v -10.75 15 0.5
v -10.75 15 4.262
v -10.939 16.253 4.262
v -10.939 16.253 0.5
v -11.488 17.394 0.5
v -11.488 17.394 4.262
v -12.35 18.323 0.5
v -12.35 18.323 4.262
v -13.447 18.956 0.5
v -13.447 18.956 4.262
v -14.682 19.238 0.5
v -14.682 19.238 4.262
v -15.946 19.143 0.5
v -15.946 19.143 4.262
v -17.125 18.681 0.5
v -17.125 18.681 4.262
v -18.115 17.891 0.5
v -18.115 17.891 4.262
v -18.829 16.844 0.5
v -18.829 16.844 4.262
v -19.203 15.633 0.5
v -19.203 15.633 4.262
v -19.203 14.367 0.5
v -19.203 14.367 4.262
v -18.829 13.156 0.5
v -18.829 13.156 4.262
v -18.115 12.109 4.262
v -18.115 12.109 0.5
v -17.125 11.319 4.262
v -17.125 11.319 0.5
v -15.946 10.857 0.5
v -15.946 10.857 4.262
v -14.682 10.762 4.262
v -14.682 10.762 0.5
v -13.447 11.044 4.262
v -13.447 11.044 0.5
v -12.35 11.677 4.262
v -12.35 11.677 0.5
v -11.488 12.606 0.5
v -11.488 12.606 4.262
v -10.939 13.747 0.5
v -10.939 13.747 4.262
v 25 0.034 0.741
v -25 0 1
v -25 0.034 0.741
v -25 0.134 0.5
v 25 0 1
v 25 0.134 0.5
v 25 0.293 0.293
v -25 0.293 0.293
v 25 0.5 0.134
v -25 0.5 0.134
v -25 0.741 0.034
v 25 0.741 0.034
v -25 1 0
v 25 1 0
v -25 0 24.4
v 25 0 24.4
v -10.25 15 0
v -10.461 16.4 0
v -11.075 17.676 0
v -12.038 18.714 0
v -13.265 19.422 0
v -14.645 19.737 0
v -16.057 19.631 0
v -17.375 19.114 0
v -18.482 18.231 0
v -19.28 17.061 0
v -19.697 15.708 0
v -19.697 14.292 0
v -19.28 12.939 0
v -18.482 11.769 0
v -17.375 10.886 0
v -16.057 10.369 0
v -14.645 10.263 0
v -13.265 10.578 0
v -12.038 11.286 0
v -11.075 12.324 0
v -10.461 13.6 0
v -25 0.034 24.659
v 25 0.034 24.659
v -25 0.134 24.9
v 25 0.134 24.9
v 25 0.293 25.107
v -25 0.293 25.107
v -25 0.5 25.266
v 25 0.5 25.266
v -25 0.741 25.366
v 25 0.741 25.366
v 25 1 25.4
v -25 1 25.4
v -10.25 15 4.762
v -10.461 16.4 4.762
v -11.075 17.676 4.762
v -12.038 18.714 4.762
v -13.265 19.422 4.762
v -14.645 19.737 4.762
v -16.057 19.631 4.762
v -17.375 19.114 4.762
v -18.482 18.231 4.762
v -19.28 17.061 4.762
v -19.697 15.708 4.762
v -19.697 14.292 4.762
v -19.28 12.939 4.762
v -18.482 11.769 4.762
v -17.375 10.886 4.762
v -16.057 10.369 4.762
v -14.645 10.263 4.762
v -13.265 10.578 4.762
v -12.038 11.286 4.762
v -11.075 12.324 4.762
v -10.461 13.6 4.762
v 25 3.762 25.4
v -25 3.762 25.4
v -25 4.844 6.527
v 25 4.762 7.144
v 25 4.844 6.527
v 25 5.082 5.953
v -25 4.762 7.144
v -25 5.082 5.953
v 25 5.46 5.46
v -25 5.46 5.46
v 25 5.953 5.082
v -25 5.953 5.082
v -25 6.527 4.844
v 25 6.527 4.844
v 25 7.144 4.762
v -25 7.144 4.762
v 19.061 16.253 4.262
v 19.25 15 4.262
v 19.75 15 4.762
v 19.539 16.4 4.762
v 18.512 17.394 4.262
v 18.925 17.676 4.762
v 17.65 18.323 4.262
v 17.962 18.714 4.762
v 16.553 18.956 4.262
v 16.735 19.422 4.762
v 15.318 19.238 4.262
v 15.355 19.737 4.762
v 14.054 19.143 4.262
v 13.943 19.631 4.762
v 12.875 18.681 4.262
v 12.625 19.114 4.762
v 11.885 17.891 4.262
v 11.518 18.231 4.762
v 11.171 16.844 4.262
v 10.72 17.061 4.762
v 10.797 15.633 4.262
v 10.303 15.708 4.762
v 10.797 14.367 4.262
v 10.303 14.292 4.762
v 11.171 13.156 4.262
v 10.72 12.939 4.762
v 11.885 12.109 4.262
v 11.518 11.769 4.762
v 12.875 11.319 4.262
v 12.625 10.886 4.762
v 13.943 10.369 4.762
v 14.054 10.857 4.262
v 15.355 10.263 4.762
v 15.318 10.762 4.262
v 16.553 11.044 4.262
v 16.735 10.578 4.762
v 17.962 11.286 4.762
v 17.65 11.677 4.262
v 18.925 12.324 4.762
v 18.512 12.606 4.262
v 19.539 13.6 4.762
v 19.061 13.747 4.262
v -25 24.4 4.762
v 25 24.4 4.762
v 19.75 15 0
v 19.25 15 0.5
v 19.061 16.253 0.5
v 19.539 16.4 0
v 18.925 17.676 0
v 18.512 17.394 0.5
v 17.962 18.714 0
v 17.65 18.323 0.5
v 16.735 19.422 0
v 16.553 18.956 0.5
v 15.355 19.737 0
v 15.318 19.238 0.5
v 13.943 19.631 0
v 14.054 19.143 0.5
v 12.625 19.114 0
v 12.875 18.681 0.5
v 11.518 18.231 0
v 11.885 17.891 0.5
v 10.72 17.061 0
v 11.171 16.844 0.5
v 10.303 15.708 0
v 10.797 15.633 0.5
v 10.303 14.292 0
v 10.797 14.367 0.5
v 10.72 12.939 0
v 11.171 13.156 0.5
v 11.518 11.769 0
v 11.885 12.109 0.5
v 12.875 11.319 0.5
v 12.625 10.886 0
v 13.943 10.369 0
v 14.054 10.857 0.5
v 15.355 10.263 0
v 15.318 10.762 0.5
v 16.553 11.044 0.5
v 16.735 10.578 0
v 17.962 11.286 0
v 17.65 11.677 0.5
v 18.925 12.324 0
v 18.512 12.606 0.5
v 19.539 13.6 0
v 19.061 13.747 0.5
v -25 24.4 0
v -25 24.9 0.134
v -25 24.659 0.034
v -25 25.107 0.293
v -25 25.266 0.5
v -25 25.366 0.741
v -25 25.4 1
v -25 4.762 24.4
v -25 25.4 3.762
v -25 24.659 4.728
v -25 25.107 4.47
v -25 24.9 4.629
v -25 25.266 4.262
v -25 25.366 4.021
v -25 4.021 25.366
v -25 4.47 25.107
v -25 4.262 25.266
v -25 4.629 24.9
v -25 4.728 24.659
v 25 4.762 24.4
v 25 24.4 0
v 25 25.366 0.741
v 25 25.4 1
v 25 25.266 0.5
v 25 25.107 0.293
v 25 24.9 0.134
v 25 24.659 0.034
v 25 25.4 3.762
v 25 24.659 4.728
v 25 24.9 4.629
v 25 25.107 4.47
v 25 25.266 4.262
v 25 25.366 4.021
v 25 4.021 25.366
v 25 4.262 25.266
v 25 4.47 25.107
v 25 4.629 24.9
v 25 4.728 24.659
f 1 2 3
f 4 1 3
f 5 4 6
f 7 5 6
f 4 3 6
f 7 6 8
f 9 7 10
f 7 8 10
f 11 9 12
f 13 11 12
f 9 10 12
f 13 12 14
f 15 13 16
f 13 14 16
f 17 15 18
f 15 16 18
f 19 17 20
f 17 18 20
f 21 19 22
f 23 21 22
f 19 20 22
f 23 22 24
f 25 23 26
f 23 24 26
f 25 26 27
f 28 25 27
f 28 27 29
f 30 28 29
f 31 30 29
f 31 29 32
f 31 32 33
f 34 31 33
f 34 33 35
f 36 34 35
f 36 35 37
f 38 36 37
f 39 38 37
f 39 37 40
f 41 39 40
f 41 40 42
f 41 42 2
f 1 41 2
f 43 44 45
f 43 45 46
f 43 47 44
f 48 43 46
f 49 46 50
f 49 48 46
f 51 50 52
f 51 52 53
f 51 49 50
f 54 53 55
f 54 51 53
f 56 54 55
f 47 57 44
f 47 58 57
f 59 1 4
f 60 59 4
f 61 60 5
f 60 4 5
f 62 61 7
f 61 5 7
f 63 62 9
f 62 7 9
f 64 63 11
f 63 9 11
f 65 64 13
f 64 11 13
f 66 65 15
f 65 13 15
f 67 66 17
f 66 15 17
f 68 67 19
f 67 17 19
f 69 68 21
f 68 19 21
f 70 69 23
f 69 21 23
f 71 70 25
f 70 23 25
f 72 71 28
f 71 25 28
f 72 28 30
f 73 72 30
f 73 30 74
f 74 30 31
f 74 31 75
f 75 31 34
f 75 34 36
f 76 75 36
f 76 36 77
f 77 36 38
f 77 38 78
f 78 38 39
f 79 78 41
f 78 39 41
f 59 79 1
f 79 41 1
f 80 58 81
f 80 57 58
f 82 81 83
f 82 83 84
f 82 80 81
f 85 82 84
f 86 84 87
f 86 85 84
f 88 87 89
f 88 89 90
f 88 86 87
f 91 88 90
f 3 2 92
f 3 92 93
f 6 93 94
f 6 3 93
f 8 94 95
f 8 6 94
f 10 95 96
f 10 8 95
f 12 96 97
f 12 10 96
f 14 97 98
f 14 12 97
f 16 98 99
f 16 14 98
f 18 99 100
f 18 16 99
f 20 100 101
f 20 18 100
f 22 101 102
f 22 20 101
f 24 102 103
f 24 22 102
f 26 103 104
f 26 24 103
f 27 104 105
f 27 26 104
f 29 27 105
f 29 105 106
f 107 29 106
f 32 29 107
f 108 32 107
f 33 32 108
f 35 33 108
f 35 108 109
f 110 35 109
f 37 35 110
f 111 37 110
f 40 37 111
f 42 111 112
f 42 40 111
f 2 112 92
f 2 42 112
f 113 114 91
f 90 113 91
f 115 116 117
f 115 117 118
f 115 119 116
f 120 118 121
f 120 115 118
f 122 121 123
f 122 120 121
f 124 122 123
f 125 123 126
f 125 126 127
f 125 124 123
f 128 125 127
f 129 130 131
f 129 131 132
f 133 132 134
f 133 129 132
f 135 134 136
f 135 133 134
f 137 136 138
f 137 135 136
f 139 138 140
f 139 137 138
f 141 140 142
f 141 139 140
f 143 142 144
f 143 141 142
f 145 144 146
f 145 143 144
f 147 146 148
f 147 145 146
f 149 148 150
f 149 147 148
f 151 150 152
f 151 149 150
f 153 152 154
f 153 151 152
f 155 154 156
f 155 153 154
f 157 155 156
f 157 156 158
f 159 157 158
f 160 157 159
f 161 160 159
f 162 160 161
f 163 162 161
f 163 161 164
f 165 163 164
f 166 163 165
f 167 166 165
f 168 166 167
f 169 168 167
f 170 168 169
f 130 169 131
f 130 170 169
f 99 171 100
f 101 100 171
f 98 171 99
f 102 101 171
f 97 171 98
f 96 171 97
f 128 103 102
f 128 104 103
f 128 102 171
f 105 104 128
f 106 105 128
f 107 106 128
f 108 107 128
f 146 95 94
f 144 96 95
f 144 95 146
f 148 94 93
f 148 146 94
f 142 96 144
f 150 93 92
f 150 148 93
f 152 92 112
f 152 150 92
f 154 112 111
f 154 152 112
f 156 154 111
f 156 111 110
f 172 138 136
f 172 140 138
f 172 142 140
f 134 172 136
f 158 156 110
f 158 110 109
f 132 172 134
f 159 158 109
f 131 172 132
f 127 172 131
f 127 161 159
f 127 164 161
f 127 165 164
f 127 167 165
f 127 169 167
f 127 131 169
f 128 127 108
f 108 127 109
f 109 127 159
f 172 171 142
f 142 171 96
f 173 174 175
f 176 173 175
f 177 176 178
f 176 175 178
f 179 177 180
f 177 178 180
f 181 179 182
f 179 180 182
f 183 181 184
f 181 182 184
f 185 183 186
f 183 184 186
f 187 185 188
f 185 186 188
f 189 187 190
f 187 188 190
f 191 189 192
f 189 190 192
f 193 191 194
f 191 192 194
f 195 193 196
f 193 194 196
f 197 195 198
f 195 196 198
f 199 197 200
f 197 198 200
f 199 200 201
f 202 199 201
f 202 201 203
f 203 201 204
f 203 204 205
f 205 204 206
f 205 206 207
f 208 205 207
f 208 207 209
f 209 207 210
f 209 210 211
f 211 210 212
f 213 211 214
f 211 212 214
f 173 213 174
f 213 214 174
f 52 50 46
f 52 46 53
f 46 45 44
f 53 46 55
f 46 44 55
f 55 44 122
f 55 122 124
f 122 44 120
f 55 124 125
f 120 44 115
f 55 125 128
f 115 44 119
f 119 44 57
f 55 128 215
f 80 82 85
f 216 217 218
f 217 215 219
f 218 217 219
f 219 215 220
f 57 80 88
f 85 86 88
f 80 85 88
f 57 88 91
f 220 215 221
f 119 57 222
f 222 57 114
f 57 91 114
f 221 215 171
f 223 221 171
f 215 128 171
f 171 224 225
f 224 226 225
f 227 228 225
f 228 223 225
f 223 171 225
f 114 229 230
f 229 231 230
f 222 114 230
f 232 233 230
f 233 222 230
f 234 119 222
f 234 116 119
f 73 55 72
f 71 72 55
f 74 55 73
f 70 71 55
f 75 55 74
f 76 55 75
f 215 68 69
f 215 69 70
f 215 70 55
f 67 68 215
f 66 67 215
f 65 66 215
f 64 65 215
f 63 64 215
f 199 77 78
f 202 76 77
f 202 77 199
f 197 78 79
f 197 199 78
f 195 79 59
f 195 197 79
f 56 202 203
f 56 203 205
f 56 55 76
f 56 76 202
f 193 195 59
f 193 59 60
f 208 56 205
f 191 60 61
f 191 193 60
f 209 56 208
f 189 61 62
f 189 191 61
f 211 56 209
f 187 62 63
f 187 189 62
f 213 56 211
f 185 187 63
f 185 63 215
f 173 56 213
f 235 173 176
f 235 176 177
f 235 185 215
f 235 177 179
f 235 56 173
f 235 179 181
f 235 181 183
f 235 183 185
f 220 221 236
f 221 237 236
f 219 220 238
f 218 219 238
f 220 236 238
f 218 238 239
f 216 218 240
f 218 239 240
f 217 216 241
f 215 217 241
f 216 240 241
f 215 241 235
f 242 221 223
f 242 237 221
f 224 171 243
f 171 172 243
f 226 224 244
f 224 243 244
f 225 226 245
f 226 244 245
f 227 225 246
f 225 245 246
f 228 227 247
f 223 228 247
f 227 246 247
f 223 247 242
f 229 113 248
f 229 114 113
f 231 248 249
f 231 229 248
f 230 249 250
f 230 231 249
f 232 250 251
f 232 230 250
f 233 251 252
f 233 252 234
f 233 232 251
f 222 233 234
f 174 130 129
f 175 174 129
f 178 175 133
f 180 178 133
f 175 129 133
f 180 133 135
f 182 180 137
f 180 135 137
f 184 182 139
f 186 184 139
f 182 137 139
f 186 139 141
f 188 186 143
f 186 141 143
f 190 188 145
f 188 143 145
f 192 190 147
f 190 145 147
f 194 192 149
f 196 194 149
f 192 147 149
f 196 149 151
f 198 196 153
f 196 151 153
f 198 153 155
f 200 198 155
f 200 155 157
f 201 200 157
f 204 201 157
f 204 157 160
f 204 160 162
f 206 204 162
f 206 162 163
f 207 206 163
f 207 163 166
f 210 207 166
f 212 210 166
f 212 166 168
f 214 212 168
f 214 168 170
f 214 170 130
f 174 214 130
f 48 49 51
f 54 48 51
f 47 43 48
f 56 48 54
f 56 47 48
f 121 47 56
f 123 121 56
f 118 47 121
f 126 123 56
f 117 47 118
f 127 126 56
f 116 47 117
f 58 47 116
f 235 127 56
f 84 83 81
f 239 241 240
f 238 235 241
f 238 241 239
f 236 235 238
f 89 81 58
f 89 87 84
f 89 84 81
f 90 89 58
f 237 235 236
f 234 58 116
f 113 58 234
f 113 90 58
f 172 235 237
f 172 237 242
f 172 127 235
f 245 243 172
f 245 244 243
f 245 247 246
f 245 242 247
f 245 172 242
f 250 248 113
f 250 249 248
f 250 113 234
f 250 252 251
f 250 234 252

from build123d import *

# Parameters (mm, degrees)
F1_DEPTH = 25
F2_R     = 1
F3_R     = 2.38125
F4_R     = 4.25
F5_DEPTH = 25
F6_SIZE  = 0.5
F7_R     = 2.5
F8_DEPTH = 25


with BuildPart() as f1:
    # F0 (on Right) → F1 (new body, symmetric)
    with BuildSketch(Plane.YZ):
        Polygon((0, 25.4), (0, 0), (25.4, 0), (25.4, 4.7625), (4.7625, 4.7625), (4.7625, 25.4), align=None)
    extrude(amount=F1_DEPTH, both=True)

    # F2
    f2_edges = [f1.edges().sort_by_distance(p)[0] for p in [
        (0, 0, 25.4),
        (0, 4.7625, 25.4),
        (0, 0, 0),
        (0, 25.4, 4.7625),
        (0, 25.4, 0),
    ]]
    fillet(f2_edges, radius=F2_R)

    # F3
    f3_edges = [f1.edges().sort_by_distance(p)[0] for p in [
        (0, 4.7625, 4.7625),
    ]]
    fillet(f3_edges, radius=F3_R)

    # F4 (on face) → F5 (cut)
    with BuildSketch(Plane.XY.offset(4.7625)):
        with Locations((-15, 15)):
            Circle(F4_R)
        with Locations((715, 15)):
            Circle(F4_R)
        with Locations((1445, 15)):
            Circle(F4_R)
        with Locations((15, 15)):
            Circle(F4_R)
    extrude(amount=-F5_DEPTH, mode=Mode.SUBTRACT)

    # F6
    f6_edges = [f1.edges().sort_by_distance(p)[0] for p in [
        (-19.25, 15, 4.7625),
        (-10.75, 15, 2.38125),
        (-19.25, 15, 0),
        (10.75, 15, 4.7625),
        (19.25, 15, 2.38125),
        (10.75, 15, 0),
    ]]
    chamfer(f6_edges, length=F6_SIZE)

    # F7 (on face) → F8 (cut)
    with BuildSketch(Plane.XZ):
        with Locations((65, 20)):
            Circle(F7_R)
        with Locations((-65, 20)):
            Circle(F7_R)
    extrude(amount=-F8_DEPTH, mode=Mode.SUBTRACT)


solid = f1.part
